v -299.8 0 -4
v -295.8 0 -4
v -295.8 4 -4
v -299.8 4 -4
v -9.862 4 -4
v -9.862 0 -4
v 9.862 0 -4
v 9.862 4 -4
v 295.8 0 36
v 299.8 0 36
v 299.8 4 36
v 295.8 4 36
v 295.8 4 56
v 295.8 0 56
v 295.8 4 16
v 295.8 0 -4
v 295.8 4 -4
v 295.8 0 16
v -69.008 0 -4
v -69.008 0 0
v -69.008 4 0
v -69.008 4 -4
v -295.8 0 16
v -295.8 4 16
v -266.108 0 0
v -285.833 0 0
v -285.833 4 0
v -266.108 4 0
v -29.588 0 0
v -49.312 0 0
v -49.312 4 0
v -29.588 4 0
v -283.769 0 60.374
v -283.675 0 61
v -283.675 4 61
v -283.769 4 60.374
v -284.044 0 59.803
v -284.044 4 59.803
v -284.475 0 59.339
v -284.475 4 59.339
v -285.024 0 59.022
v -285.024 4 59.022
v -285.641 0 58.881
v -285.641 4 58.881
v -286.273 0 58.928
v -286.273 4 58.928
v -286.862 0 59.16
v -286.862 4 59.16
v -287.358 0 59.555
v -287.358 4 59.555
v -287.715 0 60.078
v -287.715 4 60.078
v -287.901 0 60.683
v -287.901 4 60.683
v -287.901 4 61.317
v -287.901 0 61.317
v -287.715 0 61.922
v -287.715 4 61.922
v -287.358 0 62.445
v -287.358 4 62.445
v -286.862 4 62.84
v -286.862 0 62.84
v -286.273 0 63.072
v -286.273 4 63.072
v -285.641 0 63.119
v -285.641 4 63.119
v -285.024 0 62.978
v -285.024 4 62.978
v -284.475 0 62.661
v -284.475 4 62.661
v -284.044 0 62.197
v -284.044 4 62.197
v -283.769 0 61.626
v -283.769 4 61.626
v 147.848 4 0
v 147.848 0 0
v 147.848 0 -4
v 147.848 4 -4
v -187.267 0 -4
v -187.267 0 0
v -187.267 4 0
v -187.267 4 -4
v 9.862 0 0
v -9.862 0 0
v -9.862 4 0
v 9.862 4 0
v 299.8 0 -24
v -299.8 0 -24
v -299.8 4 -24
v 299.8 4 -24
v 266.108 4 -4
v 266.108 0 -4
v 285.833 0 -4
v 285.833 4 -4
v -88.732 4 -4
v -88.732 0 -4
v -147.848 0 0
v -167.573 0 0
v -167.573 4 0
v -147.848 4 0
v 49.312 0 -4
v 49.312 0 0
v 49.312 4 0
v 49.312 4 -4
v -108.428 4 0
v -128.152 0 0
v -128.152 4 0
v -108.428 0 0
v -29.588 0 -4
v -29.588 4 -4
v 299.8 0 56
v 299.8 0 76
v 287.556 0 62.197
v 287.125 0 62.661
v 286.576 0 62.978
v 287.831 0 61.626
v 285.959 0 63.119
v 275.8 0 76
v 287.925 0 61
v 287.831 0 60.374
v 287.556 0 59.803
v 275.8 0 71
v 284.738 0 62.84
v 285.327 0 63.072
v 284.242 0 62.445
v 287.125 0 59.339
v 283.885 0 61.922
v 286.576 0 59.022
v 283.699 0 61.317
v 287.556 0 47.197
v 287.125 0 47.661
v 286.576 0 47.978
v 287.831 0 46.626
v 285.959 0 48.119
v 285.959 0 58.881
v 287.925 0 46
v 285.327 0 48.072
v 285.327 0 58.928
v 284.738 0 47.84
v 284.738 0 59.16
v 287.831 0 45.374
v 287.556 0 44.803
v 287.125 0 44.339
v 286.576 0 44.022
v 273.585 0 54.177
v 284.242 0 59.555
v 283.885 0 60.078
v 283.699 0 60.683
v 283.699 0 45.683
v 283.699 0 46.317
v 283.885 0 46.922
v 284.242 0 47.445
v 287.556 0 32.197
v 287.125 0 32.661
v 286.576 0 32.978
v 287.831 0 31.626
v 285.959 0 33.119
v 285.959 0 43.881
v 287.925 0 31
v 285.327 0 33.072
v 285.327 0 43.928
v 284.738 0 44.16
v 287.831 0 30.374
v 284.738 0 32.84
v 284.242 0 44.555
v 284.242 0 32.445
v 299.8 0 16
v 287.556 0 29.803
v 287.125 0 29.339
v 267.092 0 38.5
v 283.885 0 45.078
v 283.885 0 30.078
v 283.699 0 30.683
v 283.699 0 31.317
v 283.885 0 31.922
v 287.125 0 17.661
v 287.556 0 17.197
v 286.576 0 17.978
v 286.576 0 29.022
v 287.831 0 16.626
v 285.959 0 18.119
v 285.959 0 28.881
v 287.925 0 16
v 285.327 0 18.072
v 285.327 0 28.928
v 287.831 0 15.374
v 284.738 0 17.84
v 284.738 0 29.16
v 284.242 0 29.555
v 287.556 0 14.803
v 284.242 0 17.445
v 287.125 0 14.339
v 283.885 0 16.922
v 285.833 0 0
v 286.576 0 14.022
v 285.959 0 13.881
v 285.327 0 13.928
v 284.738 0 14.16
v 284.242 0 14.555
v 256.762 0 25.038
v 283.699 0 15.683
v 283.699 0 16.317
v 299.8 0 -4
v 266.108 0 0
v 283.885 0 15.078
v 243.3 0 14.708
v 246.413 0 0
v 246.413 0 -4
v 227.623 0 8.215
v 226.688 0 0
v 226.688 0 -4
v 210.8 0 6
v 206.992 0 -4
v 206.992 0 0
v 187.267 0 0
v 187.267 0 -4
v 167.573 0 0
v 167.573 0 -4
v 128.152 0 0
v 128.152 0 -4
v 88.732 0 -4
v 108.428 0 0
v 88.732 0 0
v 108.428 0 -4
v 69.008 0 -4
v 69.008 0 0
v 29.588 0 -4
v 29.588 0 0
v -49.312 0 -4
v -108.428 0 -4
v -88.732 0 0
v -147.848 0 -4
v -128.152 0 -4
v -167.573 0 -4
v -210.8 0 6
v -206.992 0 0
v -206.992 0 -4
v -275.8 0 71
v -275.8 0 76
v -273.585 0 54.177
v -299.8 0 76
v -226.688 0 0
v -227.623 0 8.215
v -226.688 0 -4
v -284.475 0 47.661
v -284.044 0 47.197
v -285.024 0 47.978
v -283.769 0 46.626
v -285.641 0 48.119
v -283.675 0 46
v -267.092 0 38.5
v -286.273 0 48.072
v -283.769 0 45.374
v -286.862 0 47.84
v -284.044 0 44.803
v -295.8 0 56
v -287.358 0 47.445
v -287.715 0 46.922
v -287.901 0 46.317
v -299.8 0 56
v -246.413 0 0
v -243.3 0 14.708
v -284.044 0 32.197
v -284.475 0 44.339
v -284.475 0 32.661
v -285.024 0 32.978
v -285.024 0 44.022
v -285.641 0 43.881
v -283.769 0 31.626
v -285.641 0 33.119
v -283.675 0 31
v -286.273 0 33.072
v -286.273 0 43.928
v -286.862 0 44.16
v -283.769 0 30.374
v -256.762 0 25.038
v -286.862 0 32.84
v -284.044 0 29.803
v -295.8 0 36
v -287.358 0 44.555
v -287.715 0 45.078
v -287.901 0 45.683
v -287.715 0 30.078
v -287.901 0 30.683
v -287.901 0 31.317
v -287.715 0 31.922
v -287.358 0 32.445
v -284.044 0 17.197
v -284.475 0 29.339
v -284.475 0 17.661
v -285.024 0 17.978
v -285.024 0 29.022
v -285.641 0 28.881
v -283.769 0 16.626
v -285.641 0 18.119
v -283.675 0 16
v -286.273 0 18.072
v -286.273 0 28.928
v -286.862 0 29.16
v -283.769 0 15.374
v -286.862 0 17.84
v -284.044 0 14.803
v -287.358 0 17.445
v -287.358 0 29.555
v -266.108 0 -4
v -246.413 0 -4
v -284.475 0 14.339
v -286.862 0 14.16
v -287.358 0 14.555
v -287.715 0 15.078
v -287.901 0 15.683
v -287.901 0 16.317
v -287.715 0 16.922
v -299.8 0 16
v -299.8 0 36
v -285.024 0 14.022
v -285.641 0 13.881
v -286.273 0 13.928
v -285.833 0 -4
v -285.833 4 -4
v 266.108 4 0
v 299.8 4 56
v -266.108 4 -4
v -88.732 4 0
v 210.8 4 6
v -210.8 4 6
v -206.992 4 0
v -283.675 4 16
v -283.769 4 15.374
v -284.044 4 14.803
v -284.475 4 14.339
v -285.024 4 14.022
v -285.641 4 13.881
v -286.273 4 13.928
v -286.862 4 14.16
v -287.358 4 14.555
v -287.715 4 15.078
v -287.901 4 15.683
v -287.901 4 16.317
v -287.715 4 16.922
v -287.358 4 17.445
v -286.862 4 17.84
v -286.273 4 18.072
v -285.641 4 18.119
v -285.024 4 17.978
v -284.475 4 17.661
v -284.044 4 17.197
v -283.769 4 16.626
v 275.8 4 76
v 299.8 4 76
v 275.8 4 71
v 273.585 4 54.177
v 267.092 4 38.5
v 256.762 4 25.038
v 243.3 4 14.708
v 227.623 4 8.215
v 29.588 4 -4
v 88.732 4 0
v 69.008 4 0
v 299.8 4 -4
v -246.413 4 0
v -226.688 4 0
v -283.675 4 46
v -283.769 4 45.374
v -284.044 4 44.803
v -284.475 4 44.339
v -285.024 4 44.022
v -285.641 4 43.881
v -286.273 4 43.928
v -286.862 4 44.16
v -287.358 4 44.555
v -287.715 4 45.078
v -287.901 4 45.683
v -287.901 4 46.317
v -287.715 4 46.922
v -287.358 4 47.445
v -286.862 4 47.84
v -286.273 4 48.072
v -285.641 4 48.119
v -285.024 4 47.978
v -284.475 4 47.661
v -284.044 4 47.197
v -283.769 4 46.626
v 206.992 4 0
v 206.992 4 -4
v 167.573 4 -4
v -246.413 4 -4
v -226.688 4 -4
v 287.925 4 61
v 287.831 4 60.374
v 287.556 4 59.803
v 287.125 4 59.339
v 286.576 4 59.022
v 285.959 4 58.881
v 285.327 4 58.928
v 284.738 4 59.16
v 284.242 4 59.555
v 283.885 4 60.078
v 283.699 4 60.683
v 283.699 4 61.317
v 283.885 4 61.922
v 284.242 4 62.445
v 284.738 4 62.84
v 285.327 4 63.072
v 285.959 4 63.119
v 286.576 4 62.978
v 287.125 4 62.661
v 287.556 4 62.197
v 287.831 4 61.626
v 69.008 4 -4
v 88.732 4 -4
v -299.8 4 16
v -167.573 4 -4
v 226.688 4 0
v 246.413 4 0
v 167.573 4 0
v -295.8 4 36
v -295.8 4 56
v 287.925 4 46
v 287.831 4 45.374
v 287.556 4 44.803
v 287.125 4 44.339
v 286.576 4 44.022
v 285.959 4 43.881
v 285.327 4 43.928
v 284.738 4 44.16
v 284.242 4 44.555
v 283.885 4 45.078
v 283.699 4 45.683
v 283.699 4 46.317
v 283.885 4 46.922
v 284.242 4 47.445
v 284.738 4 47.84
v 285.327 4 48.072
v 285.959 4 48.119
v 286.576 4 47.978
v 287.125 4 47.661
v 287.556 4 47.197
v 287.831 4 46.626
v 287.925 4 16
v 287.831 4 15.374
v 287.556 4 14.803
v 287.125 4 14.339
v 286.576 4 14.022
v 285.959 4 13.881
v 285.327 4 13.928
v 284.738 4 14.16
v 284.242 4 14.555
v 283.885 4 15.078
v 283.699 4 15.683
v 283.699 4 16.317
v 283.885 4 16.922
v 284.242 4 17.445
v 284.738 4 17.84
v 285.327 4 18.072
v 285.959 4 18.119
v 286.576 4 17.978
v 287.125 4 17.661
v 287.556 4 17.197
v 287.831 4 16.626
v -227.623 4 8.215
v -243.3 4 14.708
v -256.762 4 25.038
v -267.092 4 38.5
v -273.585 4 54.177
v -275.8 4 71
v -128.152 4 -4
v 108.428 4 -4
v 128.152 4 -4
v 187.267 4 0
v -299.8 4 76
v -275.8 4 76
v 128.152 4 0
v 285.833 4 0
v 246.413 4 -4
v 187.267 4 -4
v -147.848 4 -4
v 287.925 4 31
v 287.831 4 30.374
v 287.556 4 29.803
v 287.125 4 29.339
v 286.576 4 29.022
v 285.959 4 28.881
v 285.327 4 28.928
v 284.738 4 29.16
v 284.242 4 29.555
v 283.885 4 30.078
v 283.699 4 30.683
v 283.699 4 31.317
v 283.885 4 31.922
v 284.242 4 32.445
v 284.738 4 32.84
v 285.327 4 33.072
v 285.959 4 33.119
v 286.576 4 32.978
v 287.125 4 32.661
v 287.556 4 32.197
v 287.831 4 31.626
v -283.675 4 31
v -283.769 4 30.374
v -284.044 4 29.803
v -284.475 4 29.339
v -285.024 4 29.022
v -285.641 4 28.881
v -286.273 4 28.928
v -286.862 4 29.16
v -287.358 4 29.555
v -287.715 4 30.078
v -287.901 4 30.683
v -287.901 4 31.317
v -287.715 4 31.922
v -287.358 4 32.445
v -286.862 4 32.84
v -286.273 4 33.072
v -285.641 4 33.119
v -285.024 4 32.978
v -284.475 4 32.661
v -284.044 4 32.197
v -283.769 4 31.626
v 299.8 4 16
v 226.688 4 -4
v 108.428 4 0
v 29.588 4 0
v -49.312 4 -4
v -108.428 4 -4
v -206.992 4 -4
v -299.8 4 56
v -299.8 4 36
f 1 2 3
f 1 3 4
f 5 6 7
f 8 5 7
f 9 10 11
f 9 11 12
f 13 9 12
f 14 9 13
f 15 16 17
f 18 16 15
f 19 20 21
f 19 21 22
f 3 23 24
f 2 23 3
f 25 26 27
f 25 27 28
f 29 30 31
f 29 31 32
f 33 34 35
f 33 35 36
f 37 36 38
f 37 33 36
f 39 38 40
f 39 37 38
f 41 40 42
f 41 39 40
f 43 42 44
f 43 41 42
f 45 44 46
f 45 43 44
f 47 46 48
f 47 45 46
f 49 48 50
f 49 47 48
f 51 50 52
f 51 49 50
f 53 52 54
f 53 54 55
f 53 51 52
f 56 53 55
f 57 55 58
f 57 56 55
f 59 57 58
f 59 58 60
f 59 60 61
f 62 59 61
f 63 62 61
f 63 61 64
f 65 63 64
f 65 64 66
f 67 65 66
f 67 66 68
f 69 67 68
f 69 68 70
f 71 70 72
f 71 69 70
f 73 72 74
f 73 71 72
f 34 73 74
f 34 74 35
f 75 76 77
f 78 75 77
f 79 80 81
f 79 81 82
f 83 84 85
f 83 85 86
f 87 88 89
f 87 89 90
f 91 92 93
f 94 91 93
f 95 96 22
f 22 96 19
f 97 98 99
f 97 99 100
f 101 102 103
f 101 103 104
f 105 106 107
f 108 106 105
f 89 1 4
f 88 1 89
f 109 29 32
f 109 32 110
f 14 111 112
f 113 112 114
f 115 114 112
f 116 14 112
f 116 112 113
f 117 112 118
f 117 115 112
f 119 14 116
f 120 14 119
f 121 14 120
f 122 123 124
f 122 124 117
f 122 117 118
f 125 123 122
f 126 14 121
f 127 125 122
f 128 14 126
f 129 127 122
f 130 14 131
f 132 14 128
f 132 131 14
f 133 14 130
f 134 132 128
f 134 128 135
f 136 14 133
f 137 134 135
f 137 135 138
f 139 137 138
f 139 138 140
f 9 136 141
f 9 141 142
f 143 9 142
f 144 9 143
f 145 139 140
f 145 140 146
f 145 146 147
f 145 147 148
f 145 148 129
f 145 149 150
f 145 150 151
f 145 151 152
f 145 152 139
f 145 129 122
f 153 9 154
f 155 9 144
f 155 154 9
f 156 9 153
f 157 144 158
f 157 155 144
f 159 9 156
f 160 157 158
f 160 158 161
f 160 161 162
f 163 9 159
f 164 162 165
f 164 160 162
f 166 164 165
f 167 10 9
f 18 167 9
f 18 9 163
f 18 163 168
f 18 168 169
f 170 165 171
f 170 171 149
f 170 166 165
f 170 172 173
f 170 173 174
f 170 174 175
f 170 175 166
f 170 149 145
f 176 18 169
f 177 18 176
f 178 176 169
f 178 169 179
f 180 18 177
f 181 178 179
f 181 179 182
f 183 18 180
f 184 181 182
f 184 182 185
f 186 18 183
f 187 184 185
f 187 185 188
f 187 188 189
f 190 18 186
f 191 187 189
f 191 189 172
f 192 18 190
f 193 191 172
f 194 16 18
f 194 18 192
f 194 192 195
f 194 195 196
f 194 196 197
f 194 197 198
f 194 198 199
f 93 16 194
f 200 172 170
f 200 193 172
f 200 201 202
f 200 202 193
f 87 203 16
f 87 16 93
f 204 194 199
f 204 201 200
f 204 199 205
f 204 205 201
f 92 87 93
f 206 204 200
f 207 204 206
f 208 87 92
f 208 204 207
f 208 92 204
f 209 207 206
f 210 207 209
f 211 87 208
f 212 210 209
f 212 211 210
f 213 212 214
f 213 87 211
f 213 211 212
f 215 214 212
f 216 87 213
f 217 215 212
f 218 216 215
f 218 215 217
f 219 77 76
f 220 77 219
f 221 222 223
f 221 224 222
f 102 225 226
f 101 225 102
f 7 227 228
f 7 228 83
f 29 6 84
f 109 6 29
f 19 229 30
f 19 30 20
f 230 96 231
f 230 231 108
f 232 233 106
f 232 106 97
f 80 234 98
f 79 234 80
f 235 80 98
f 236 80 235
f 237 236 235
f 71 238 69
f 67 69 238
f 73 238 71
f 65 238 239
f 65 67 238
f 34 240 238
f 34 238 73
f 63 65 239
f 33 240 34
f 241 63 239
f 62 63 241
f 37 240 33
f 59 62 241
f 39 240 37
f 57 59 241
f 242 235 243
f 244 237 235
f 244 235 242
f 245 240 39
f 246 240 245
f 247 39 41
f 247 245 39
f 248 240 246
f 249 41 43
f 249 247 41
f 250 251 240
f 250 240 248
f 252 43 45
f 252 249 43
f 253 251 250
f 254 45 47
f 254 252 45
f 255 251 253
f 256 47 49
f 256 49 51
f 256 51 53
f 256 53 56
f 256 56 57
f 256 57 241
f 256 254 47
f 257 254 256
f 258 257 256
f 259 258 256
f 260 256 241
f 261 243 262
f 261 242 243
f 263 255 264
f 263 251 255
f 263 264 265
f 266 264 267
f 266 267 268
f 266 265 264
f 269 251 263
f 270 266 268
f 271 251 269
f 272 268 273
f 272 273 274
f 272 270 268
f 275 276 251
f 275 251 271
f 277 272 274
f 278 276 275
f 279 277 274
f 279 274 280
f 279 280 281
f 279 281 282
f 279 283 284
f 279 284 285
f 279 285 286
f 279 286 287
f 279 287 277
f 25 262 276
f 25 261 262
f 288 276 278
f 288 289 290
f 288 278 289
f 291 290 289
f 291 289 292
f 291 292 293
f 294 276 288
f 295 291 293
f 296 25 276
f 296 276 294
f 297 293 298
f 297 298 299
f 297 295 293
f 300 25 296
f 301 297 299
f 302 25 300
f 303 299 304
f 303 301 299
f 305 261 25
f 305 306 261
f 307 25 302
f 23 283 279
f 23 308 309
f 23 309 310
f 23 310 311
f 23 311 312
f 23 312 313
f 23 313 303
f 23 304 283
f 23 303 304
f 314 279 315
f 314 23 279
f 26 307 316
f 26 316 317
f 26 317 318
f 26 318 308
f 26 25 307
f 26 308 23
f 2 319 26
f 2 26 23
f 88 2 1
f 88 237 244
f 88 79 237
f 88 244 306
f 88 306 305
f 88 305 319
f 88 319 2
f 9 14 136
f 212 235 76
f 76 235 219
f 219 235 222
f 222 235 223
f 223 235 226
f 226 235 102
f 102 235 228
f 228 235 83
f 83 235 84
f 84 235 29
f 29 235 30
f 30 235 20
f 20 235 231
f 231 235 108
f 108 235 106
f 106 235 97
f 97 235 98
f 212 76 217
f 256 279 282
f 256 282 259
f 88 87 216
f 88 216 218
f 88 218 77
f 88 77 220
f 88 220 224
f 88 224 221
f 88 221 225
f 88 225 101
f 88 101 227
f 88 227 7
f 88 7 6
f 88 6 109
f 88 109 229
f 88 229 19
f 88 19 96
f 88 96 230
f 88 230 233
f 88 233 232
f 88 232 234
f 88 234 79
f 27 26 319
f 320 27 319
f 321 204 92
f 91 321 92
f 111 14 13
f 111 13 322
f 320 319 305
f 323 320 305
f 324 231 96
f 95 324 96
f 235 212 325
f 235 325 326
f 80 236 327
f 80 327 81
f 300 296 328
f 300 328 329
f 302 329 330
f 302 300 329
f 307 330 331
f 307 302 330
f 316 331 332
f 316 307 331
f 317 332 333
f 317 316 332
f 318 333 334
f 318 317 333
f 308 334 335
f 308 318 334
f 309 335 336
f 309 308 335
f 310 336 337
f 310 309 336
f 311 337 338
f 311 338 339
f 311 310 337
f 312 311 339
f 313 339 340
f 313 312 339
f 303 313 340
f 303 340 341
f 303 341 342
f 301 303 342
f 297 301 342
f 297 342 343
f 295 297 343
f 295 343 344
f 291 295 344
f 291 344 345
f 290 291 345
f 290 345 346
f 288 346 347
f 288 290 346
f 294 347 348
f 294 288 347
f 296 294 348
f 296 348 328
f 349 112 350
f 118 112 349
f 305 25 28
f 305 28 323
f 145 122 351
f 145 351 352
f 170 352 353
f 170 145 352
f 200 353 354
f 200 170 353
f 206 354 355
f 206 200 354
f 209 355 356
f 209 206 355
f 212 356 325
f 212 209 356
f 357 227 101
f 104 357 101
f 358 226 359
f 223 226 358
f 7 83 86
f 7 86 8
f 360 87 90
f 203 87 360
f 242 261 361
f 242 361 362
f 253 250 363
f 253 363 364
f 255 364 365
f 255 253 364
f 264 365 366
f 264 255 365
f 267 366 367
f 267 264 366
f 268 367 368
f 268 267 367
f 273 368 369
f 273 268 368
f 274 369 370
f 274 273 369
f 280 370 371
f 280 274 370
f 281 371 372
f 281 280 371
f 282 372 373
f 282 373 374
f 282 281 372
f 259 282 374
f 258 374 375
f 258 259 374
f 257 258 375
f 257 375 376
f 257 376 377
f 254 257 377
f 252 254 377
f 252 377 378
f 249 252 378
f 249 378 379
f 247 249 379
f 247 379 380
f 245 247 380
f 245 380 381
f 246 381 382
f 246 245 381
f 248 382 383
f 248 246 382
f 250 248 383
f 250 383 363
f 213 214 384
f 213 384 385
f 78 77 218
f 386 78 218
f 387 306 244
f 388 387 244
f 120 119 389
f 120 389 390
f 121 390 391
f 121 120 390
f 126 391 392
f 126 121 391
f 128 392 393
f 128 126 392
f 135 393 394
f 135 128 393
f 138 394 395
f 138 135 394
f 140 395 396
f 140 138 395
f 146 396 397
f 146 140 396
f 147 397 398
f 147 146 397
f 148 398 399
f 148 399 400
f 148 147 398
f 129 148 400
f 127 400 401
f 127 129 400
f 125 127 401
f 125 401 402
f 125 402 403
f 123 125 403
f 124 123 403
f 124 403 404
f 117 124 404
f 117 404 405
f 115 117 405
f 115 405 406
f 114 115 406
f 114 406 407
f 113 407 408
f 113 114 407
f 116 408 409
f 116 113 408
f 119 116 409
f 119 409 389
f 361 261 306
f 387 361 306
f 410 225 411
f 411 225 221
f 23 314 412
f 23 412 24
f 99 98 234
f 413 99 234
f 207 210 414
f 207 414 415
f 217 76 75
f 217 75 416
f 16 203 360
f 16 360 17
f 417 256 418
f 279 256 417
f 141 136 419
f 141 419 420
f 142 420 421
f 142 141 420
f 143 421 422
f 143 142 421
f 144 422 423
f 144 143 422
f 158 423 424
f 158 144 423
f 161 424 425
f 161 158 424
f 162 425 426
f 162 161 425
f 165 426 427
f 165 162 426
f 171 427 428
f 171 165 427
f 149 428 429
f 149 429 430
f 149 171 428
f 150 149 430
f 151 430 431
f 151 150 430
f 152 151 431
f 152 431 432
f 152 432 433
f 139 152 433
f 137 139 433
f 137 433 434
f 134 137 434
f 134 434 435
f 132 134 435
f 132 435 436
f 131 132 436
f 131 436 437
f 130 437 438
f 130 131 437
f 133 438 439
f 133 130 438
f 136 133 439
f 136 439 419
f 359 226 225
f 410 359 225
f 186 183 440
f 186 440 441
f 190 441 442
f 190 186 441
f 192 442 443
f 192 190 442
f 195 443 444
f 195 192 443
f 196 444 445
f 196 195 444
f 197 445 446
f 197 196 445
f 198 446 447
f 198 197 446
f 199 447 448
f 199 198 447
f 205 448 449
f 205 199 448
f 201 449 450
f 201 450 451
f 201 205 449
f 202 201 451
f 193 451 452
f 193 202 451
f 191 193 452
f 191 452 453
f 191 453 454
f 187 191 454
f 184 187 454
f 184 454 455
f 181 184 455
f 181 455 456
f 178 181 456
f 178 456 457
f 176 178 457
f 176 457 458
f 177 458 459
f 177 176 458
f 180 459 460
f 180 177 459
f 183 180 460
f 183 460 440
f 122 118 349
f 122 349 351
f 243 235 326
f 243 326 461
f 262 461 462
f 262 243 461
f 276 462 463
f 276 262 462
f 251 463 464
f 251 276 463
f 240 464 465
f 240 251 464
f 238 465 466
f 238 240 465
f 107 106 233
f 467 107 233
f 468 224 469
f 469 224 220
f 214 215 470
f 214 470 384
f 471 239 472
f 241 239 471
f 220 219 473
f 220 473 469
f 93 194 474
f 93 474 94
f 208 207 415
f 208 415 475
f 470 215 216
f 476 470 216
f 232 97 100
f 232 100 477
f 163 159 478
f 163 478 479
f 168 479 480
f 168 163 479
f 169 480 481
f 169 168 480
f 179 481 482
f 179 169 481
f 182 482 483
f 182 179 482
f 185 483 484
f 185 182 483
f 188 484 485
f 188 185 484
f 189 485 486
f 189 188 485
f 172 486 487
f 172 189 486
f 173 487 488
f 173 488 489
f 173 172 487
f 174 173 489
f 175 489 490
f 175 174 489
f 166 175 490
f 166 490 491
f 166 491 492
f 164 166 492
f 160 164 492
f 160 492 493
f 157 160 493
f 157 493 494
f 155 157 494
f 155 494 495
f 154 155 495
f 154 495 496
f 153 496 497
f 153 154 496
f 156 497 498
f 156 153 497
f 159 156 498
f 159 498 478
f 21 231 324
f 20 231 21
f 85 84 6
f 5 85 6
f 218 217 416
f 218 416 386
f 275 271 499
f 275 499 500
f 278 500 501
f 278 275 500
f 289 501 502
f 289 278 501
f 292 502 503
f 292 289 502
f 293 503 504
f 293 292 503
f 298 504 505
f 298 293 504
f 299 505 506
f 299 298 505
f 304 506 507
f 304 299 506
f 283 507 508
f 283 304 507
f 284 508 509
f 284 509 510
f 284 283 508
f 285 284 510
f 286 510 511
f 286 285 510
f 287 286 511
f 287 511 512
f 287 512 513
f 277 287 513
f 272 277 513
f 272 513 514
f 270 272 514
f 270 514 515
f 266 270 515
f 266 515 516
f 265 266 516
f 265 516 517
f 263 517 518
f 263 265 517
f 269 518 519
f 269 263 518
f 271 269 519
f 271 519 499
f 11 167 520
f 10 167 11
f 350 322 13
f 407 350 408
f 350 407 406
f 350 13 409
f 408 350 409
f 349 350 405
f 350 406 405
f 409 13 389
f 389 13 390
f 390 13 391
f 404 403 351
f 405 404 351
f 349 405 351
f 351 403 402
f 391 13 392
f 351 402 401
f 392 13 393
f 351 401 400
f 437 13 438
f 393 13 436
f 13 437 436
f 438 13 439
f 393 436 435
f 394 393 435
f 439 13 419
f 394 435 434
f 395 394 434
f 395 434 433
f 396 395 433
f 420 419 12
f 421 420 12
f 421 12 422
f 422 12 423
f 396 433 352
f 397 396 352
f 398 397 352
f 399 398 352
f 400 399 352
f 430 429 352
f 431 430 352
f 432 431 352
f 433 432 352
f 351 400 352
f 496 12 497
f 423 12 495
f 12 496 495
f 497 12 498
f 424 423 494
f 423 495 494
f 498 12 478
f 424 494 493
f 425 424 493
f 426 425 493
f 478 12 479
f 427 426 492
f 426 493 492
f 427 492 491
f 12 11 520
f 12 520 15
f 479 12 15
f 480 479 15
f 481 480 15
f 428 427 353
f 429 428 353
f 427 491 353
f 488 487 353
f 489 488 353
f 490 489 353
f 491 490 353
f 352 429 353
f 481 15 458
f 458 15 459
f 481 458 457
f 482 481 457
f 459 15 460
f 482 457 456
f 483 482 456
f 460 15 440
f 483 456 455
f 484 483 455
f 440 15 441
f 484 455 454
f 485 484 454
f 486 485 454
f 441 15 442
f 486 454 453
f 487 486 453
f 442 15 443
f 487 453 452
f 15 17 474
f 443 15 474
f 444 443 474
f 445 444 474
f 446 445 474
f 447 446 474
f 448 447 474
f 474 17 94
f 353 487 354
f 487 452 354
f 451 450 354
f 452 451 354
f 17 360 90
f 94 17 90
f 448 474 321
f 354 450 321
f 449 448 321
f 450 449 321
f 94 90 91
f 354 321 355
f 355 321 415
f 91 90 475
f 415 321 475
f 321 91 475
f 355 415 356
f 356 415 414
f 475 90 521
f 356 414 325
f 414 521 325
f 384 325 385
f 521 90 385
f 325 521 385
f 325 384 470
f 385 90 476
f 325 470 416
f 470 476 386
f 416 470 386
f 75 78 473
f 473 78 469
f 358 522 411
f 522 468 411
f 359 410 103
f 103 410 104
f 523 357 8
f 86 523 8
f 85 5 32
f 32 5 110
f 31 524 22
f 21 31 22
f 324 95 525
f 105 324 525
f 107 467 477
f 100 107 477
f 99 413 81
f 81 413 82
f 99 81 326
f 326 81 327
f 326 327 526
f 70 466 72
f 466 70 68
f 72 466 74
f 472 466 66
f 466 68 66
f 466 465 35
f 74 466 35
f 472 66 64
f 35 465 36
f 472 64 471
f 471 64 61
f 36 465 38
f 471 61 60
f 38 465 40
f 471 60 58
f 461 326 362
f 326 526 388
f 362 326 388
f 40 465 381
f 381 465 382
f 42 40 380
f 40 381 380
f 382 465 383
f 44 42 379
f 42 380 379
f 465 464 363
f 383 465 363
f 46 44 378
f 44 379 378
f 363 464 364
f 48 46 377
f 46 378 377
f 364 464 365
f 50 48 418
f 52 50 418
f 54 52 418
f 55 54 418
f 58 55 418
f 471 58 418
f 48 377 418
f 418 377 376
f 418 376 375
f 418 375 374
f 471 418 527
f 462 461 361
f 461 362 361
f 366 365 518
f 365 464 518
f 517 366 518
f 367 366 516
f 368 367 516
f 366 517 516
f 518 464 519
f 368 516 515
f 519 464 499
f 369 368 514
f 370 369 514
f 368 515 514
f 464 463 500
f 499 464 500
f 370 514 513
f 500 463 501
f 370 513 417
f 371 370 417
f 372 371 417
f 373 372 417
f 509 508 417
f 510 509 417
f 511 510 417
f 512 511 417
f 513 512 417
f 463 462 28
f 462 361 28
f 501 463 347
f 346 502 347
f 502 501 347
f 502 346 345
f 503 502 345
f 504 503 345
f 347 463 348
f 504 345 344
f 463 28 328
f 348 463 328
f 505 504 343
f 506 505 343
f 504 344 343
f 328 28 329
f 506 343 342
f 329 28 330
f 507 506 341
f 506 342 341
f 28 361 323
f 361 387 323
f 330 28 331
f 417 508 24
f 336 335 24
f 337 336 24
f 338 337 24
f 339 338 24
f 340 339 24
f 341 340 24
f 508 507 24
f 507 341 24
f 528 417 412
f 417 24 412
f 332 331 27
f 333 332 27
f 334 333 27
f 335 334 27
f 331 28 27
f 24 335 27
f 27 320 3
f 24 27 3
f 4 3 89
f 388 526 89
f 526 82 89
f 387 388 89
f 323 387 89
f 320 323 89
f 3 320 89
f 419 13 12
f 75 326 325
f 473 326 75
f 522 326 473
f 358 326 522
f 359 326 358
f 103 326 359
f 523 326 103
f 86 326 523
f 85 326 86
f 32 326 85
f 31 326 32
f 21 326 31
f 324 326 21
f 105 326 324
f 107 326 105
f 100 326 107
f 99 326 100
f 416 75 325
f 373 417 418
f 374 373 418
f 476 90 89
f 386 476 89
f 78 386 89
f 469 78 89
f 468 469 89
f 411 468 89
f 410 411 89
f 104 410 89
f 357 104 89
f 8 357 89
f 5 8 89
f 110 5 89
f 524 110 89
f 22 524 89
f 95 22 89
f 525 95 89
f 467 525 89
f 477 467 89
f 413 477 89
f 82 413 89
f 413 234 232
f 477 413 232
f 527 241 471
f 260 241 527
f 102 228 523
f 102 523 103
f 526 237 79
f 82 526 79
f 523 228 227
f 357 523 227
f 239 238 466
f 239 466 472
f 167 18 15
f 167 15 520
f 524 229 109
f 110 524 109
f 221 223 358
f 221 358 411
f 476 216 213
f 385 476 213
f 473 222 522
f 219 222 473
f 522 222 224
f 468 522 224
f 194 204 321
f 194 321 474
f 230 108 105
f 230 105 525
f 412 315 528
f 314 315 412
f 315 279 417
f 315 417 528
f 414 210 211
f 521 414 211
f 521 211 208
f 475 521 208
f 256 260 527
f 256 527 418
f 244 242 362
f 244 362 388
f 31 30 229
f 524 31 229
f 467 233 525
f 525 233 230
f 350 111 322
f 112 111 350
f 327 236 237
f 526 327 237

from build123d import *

# Parameters (mm, degrees)
SKETCH1_R           = 2.125
SKETCH1_W           = 19.725
SKETCH1_H           = 4
BOSS_EXTRUDE1_DEPTH = 4


with BuildPart() as part:
    # Sketch1 → Boss-Extrude1 (new body)
    with BuildSketch(Plane(origin=(0, 0, 0), x_dir=(1, 0, 0), z_dir=(0, 1, 0))):
        with BuildLine():
            Line((299.8, 24), (299.8, 4))
            Line((299.8, 4), (295.8, 4))
            Line((295.8, 4), (295.8, -16))
            Line((295.8, -16), (299.8, -16))
            Line((299.8, -16), (299.8, -36))
            Line((299.8, -36), (295.8, -36))
            Line((295.8, -36), (295.8, -56))
            Line((295.8, -56), (299.8, -56))
            Line((299.8, -56), (299.8, -76))
            Line((299.8, -76), (275.8, -76))
            Line((275.8, -76), (275.8, -71))
            ThreePointArc((275.8, -71), (256.761940777, -25.038059223), (210.8, -6))
            Line((210.8, -6), (-210.8, -6))
            ThreePointArc((-210.8, -6), (-256.761940777, -25.038059223), (-275.8, -71))
            Line((-275.8, -71), (-275.8, -76))
            Line((-275.8, -76), (-299.8, -76))
            Line((-299.8, -76), (-299.8, -56))
            Line((-299.8, -56), (-295.8, -56))
            Line((-295.8, -56), (-295.8, -36))
            Line((-295.8, -36), (-299.8, -36))
            Line((-299.8, -36), (-299.8, -16))
            Line((-299.8, -16), (-295.8, -16))
            Line((-295.8, -16), (-295.8, 4))
            Line((-295.8, 4), (-299.8, 4))
            Line((-299.8, 4), (-299.8, 24))
            Line((-299.8, 24), (299.8, 24))
        make_face()
        with Locations((285.8, -61)):
            Circle(SKETCH1_R, mode=Mode.SUBTRACT)
        with Locations((285.8, -46)):
            Circle(SKETCH1_R, mode=Mode.SUBTRACT)
        with Locations((-285.8, -46)):
            Circle(SKETCH1_R, mode=Mode.SUBTRACT)
        with Locations((-285.8, -61)):
            Circle(SKETCH1_R, mode=Mode.SUBTRACT)
        with Locations((285.8, -16)):
            Circle(SKETCH1_R, mode=Mode.SUBTRACT)
        with Locations((285.8, -31)):
            Circle(SKETCH1_R, mode=Mode.SUBTRACT)
        with Locations((-285.8, -31)):
            Circle(SKETCH1_R, mode=Mode.SUBTRACT)
        with Locations((-285.8, -16)):
            Circle(SKETCH1_R, mode=Mode.SUBTRACT)
        with Locations((0, 2)):
            Rectangle(SKETCH1_W, SKETCH1_H, mode=Mode.SUBTRACT)
        with Locations((39.45, 2)):
            Rectangle(SKETCH1_W, SKETCH1_H, mode=Mode.SUBTRACT)
        with Locations((78.87, 2)):
            Rectangle(SKETCH1_W, SKETCH1_H, mode=Mode.SUBTRACT)
        with Locations((118.29, 2)):
            Rectangle(SKETCH1_W, SKETCH1_H, mode=Mode.SUBTRACT)
        with Locations((157.71, 2)):
            Rectangle(SKETCH1_W, SKETCH1_H, mode=Mode.SUBTRACT)
        with Locations((197.13, 2)):
            Rectangle(SKETCH1_W, SKETCH1_H, mode=Mode.SUBTRACT)
        with Locations((236.55, 2)):
            Rectangle(SKETCH1_W, SKETCH1_H, mode=Mode.SUBTRACT)
        with Locations((275.97, 2)):
            Rectangle(SKETCH1_W, SKETCH1_H, mode=Mode.SUBTRACT)
        with Locations((-275.97, 2)):
            Rectangle(SKETCH1_W, SKETCH1_H, mode=Mode.SUBTRACT)
        with Locations((-236.55, 2)):
            Rectangle(SKETCH1_W, SKETCH1_H, mode=Mode.SUBTRACT)
        with Locations((-197.13, 2)):
            Rectangle(SKETCH1_W, SKETCH1_H, mode=Mode.SUBTRACT)
        with Locations((-157.71, 2)):
            Rectangle(SKETCH1_W, SKETCH1_H, mode=Mode.SUBTRACT)
        with Locations((-118.29, 2)):
            Rectangle(SKETCH1_W, SKETCH1_H, mode=Mode.SUBTRACT)
        with Locations((-78.87, 2)):
            Rectangle(SKETCH1_W, SKETCH1_H, mode=Mode.SUBTRACT)
        with Locations((-39.45, 2)):
            Rectangle(SKETCH1_W, SKETCH1_H, mode=Mode.SUBTRACT)
    extrude(amount=BOSS_EXTRUDE1_DEPTH)


solid = part.part
